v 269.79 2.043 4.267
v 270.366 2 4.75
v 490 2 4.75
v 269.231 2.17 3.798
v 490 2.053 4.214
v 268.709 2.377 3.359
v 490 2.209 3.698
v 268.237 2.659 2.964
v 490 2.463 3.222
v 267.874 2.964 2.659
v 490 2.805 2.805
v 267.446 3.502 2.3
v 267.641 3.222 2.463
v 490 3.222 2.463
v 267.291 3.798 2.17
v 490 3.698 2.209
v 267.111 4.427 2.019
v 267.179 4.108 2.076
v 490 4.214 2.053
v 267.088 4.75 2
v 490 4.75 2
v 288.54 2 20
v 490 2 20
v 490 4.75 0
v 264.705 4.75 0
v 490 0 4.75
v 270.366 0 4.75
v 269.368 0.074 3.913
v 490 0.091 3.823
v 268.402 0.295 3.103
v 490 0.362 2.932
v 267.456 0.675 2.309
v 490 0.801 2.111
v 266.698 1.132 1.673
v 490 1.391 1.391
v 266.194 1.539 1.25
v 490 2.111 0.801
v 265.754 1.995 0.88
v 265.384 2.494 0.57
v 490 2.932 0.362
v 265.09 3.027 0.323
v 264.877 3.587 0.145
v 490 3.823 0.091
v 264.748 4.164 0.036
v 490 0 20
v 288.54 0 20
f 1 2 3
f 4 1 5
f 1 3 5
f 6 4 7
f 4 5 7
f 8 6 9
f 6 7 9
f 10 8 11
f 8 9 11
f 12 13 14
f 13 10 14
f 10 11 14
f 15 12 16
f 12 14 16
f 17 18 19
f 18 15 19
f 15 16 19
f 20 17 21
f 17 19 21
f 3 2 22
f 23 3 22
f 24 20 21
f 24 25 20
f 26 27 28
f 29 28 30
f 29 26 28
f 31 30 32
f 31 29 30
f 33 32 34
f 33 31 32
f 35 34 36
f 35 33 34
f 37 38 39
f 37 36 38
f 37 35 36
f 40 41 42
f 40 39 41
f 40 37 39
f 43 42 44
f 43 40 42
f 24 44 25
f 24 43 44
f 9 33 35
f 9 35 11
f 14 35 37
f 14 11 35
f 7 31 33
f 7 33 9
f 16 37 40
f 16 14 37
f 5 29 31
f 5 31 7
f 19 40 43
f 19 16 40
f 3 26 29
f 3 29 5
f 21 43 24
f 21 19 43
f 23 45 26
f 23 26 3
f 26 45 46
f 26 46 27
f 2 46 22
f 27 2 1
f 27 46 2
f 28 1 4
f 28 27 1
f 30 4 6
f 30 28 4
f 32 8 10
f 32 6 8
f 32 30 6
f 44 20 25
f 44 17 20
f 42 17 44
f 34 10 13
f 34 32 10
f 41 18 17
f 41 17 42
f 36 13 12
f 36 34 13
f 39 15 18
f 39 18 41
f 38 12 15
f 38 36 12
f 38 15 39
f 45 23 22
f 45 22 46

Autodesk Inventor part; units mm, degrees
ref_plane "YZ Plane" through (0, 0, 0) normal (1, 0, 0) x (0, 1, 0)
ref_plane "XZ Plane" through (0, 0, 0) normal (0, 1, 0) x (-1, 0, 0)
ref_plane "XY Plane" through (0, 0, 0) normal (0, 0, 1) x (1, 0, 0)
sketch "Sketch1" plane through (0, 0, 0) normal (0, 0, 1) x (1, 0, 0)
  line L0 (-490, 40) -> (490, 40)
  line L1 (490, 40) -> (490, 0)
  line L2 (490, 0) -> (-490, 0)
  line L3 (-490, 0) -> (-490, 40)
  point P0 (0, 0)
  point P1 (0, 0)
  dimension "d0" = 980
  dimension "d1" = 40
extrude "Plate1" add sketch "Sketch1" along normal blind 2
sketch "Sketch2" plane through (490, 2, 0) normal (0, -1, 0) x (1, 0, 0)
  line L0 (-980, 0) -> (0, 0)
  line L1 (0, 0) -> (0, 20)
  line L2 (0, 20) -> (-980, 20)
  line L3 (-980, 20) -> (-980, 0)
edge flange "Flange1" height 20 angle 90 thickness 2 bend radius 2.75 thickness toward (0, -1, 0) relief round relief width 2 relief depth 1 edges at (0, 0, 2) wall of the first edge with corners at (-490, 2, 0) (490, 2, 0) (490, 2, 20) (-490, 2, 20)
bend "Bend1"
corner "Corner1"
sketch "Sketch9" plane through (0, 0, 2) normal (0, 0, 1) x (1, 0, 0)
  line L0 (-490, 4.75) -> (490, 4.75) projected
  line L1 (490, 40) -> (490, 4.75) projected
  line L2 (-490, 40) -> (490, 40) projected
  line L3 (-490, 4.75) -> (-490, 40) projected
  line L4 (0, 0) -> (0, 40) construction
  circle A0 centre (0, 40) radius 35
  circle A1 centre (490, 40) radius 35
  circle A2 centre (-490, 40) radius 35
  line L5 (246.05, 40) -> (243.95, 40)
  line L6 (243.95, 40) -> (243.95, 29)
  line L7 (243.95, 29) -> (246.05, 29)
  line L8 (246.05, 29) -> (246.05, 40)
  line L9 (-490, 40) -> (490, 40) projected
  line L10 (-246.05, 40) -> (-243.95, 40)
  line L11 (-243.95, 40) -> (-243.95, 29)
  line L12 (-243.95, 29) -> (-246.05, 29)
  line L13 (-246.05, 29) -> (-246.05, 40)
  line L14 (-490, 0) -> (490, 0) projected
  point P0 (-245, 29)
  point P1 (245, 29)
  point P2 (-243.95, 40)
  point P3 (-246.05, 40)
  point P4 (7.2068, 4.75)
  point P5 (35, 40)
  point P6 (-35, 40)
  point P7 (-7.2068, 4.75)
  point P8 (455, 40)
  point P9 (482.7932, 4.75)
  point P10 (-482.7932, 4.75)
  point P11 (-455, 40)
  point P12 (-490, 5)
  dimension "d41" = 70
  dimension "d42" = 490
  dimension "d43" = 2.1
  dimension "d44" = 29
  dimension "d45" = 11
extrude "Extrusion4" cut sketch "Sketch9" along normal through all both and the other way through all contours L3 A2 L2 L13 L12 L11 A0 L6 L7 L8 A1 L1 L0 | A2 L2 L3 | L3 L2 A2 | A1 L2 L1 | L2 L11 L12 L13 | L8 L7 L6 L2 | A0 L2 | L2 A0 picked at (473.6046, 23.6046)
sketch "Sketch10" plane through (0, 0, 2) normal (0, 0, 1) x (1, 0, 0)
  line L0 (483.1891, 23.5318) -> (483.1891, 11.5318) construction
  line L1 (483.1891, 11.5318) -> (283.1891, 11.5318) construction
  line L2 (283.1891, 11.5318) -> (283.1891, 23.5318) construction
  line L3 (283.1891, 23.5318) -> (483.1891, 23.5318) construction
  point P0 (0, 0)
  dimension "d48" = 200
  dimension "d49" = 12
feature "Mark2" [suppressed]
sketch "Sketch11" plane through (-490, 0, 20) normal (0, -1, 0) x (1, 0, 0)
  line L0 (0, -15.25) -> (0, -20) projected
  line L1 (0, 0) -> (980, 0) projected
  line L2 (0, -20) -> (778.54, -20)
  line L3 (778.54, -20) -> (778.54, 0)
  line L4 (778.54, 0) -> (0, 0)
  line L5 (0, 0) -> (0, -20)
  line L6 (778.54, 0) -> (754.7049, -20)
  line L7 (980, -20) -> (497.2068, -20) projected
  dimension "d50" = 778.54
  dimension "d51" = 50
extrude "Extrusion5" cut sketch "Sketch11" against normal through all contours L5 L1 L6 L2 L0
equation "\"d1\" = БОРТ_стрингер_4_высота"
equation "\"d2\" = Thickness"
equation "\"d3\" = BendReliefWidth"
equation "\"d4\" = BendReliefDepth"
equation "\"d5\" = MinimumRemnant"
equation "\"d6\" = TransitionRadius"
equation "\"d9\" = BendRadius"
equation "\"d10\" = CornerReliefSize"
equation "\"d11\" = GapSize"
equation "\"d12\" = JacobiRadiusSize"
equation "\"BendReliefWidth\" = Thickness"
equation "\"BendReliefDepth\" = 0.5 * Thickness"
equation "\"CornerReliefSize\" = 4 * Thickness"
equation "\"MinimumRemnant\" = 2 * Thickness"
equation "\"TransitionRadius\" = BendRadius"
equation "\"JacobiRadiusSize\" = BendRadius"
equation "\"GapSize\" = Thickness"
equation "\"БОРТ_стрингер_4_высота\" = 40"
equation "\"Thickness\" = 2"
equation "\"BendRadius\" = 2.75"
properties part number "MSC 328 STRINGER BOARD ##" material "Stainless Steel"
